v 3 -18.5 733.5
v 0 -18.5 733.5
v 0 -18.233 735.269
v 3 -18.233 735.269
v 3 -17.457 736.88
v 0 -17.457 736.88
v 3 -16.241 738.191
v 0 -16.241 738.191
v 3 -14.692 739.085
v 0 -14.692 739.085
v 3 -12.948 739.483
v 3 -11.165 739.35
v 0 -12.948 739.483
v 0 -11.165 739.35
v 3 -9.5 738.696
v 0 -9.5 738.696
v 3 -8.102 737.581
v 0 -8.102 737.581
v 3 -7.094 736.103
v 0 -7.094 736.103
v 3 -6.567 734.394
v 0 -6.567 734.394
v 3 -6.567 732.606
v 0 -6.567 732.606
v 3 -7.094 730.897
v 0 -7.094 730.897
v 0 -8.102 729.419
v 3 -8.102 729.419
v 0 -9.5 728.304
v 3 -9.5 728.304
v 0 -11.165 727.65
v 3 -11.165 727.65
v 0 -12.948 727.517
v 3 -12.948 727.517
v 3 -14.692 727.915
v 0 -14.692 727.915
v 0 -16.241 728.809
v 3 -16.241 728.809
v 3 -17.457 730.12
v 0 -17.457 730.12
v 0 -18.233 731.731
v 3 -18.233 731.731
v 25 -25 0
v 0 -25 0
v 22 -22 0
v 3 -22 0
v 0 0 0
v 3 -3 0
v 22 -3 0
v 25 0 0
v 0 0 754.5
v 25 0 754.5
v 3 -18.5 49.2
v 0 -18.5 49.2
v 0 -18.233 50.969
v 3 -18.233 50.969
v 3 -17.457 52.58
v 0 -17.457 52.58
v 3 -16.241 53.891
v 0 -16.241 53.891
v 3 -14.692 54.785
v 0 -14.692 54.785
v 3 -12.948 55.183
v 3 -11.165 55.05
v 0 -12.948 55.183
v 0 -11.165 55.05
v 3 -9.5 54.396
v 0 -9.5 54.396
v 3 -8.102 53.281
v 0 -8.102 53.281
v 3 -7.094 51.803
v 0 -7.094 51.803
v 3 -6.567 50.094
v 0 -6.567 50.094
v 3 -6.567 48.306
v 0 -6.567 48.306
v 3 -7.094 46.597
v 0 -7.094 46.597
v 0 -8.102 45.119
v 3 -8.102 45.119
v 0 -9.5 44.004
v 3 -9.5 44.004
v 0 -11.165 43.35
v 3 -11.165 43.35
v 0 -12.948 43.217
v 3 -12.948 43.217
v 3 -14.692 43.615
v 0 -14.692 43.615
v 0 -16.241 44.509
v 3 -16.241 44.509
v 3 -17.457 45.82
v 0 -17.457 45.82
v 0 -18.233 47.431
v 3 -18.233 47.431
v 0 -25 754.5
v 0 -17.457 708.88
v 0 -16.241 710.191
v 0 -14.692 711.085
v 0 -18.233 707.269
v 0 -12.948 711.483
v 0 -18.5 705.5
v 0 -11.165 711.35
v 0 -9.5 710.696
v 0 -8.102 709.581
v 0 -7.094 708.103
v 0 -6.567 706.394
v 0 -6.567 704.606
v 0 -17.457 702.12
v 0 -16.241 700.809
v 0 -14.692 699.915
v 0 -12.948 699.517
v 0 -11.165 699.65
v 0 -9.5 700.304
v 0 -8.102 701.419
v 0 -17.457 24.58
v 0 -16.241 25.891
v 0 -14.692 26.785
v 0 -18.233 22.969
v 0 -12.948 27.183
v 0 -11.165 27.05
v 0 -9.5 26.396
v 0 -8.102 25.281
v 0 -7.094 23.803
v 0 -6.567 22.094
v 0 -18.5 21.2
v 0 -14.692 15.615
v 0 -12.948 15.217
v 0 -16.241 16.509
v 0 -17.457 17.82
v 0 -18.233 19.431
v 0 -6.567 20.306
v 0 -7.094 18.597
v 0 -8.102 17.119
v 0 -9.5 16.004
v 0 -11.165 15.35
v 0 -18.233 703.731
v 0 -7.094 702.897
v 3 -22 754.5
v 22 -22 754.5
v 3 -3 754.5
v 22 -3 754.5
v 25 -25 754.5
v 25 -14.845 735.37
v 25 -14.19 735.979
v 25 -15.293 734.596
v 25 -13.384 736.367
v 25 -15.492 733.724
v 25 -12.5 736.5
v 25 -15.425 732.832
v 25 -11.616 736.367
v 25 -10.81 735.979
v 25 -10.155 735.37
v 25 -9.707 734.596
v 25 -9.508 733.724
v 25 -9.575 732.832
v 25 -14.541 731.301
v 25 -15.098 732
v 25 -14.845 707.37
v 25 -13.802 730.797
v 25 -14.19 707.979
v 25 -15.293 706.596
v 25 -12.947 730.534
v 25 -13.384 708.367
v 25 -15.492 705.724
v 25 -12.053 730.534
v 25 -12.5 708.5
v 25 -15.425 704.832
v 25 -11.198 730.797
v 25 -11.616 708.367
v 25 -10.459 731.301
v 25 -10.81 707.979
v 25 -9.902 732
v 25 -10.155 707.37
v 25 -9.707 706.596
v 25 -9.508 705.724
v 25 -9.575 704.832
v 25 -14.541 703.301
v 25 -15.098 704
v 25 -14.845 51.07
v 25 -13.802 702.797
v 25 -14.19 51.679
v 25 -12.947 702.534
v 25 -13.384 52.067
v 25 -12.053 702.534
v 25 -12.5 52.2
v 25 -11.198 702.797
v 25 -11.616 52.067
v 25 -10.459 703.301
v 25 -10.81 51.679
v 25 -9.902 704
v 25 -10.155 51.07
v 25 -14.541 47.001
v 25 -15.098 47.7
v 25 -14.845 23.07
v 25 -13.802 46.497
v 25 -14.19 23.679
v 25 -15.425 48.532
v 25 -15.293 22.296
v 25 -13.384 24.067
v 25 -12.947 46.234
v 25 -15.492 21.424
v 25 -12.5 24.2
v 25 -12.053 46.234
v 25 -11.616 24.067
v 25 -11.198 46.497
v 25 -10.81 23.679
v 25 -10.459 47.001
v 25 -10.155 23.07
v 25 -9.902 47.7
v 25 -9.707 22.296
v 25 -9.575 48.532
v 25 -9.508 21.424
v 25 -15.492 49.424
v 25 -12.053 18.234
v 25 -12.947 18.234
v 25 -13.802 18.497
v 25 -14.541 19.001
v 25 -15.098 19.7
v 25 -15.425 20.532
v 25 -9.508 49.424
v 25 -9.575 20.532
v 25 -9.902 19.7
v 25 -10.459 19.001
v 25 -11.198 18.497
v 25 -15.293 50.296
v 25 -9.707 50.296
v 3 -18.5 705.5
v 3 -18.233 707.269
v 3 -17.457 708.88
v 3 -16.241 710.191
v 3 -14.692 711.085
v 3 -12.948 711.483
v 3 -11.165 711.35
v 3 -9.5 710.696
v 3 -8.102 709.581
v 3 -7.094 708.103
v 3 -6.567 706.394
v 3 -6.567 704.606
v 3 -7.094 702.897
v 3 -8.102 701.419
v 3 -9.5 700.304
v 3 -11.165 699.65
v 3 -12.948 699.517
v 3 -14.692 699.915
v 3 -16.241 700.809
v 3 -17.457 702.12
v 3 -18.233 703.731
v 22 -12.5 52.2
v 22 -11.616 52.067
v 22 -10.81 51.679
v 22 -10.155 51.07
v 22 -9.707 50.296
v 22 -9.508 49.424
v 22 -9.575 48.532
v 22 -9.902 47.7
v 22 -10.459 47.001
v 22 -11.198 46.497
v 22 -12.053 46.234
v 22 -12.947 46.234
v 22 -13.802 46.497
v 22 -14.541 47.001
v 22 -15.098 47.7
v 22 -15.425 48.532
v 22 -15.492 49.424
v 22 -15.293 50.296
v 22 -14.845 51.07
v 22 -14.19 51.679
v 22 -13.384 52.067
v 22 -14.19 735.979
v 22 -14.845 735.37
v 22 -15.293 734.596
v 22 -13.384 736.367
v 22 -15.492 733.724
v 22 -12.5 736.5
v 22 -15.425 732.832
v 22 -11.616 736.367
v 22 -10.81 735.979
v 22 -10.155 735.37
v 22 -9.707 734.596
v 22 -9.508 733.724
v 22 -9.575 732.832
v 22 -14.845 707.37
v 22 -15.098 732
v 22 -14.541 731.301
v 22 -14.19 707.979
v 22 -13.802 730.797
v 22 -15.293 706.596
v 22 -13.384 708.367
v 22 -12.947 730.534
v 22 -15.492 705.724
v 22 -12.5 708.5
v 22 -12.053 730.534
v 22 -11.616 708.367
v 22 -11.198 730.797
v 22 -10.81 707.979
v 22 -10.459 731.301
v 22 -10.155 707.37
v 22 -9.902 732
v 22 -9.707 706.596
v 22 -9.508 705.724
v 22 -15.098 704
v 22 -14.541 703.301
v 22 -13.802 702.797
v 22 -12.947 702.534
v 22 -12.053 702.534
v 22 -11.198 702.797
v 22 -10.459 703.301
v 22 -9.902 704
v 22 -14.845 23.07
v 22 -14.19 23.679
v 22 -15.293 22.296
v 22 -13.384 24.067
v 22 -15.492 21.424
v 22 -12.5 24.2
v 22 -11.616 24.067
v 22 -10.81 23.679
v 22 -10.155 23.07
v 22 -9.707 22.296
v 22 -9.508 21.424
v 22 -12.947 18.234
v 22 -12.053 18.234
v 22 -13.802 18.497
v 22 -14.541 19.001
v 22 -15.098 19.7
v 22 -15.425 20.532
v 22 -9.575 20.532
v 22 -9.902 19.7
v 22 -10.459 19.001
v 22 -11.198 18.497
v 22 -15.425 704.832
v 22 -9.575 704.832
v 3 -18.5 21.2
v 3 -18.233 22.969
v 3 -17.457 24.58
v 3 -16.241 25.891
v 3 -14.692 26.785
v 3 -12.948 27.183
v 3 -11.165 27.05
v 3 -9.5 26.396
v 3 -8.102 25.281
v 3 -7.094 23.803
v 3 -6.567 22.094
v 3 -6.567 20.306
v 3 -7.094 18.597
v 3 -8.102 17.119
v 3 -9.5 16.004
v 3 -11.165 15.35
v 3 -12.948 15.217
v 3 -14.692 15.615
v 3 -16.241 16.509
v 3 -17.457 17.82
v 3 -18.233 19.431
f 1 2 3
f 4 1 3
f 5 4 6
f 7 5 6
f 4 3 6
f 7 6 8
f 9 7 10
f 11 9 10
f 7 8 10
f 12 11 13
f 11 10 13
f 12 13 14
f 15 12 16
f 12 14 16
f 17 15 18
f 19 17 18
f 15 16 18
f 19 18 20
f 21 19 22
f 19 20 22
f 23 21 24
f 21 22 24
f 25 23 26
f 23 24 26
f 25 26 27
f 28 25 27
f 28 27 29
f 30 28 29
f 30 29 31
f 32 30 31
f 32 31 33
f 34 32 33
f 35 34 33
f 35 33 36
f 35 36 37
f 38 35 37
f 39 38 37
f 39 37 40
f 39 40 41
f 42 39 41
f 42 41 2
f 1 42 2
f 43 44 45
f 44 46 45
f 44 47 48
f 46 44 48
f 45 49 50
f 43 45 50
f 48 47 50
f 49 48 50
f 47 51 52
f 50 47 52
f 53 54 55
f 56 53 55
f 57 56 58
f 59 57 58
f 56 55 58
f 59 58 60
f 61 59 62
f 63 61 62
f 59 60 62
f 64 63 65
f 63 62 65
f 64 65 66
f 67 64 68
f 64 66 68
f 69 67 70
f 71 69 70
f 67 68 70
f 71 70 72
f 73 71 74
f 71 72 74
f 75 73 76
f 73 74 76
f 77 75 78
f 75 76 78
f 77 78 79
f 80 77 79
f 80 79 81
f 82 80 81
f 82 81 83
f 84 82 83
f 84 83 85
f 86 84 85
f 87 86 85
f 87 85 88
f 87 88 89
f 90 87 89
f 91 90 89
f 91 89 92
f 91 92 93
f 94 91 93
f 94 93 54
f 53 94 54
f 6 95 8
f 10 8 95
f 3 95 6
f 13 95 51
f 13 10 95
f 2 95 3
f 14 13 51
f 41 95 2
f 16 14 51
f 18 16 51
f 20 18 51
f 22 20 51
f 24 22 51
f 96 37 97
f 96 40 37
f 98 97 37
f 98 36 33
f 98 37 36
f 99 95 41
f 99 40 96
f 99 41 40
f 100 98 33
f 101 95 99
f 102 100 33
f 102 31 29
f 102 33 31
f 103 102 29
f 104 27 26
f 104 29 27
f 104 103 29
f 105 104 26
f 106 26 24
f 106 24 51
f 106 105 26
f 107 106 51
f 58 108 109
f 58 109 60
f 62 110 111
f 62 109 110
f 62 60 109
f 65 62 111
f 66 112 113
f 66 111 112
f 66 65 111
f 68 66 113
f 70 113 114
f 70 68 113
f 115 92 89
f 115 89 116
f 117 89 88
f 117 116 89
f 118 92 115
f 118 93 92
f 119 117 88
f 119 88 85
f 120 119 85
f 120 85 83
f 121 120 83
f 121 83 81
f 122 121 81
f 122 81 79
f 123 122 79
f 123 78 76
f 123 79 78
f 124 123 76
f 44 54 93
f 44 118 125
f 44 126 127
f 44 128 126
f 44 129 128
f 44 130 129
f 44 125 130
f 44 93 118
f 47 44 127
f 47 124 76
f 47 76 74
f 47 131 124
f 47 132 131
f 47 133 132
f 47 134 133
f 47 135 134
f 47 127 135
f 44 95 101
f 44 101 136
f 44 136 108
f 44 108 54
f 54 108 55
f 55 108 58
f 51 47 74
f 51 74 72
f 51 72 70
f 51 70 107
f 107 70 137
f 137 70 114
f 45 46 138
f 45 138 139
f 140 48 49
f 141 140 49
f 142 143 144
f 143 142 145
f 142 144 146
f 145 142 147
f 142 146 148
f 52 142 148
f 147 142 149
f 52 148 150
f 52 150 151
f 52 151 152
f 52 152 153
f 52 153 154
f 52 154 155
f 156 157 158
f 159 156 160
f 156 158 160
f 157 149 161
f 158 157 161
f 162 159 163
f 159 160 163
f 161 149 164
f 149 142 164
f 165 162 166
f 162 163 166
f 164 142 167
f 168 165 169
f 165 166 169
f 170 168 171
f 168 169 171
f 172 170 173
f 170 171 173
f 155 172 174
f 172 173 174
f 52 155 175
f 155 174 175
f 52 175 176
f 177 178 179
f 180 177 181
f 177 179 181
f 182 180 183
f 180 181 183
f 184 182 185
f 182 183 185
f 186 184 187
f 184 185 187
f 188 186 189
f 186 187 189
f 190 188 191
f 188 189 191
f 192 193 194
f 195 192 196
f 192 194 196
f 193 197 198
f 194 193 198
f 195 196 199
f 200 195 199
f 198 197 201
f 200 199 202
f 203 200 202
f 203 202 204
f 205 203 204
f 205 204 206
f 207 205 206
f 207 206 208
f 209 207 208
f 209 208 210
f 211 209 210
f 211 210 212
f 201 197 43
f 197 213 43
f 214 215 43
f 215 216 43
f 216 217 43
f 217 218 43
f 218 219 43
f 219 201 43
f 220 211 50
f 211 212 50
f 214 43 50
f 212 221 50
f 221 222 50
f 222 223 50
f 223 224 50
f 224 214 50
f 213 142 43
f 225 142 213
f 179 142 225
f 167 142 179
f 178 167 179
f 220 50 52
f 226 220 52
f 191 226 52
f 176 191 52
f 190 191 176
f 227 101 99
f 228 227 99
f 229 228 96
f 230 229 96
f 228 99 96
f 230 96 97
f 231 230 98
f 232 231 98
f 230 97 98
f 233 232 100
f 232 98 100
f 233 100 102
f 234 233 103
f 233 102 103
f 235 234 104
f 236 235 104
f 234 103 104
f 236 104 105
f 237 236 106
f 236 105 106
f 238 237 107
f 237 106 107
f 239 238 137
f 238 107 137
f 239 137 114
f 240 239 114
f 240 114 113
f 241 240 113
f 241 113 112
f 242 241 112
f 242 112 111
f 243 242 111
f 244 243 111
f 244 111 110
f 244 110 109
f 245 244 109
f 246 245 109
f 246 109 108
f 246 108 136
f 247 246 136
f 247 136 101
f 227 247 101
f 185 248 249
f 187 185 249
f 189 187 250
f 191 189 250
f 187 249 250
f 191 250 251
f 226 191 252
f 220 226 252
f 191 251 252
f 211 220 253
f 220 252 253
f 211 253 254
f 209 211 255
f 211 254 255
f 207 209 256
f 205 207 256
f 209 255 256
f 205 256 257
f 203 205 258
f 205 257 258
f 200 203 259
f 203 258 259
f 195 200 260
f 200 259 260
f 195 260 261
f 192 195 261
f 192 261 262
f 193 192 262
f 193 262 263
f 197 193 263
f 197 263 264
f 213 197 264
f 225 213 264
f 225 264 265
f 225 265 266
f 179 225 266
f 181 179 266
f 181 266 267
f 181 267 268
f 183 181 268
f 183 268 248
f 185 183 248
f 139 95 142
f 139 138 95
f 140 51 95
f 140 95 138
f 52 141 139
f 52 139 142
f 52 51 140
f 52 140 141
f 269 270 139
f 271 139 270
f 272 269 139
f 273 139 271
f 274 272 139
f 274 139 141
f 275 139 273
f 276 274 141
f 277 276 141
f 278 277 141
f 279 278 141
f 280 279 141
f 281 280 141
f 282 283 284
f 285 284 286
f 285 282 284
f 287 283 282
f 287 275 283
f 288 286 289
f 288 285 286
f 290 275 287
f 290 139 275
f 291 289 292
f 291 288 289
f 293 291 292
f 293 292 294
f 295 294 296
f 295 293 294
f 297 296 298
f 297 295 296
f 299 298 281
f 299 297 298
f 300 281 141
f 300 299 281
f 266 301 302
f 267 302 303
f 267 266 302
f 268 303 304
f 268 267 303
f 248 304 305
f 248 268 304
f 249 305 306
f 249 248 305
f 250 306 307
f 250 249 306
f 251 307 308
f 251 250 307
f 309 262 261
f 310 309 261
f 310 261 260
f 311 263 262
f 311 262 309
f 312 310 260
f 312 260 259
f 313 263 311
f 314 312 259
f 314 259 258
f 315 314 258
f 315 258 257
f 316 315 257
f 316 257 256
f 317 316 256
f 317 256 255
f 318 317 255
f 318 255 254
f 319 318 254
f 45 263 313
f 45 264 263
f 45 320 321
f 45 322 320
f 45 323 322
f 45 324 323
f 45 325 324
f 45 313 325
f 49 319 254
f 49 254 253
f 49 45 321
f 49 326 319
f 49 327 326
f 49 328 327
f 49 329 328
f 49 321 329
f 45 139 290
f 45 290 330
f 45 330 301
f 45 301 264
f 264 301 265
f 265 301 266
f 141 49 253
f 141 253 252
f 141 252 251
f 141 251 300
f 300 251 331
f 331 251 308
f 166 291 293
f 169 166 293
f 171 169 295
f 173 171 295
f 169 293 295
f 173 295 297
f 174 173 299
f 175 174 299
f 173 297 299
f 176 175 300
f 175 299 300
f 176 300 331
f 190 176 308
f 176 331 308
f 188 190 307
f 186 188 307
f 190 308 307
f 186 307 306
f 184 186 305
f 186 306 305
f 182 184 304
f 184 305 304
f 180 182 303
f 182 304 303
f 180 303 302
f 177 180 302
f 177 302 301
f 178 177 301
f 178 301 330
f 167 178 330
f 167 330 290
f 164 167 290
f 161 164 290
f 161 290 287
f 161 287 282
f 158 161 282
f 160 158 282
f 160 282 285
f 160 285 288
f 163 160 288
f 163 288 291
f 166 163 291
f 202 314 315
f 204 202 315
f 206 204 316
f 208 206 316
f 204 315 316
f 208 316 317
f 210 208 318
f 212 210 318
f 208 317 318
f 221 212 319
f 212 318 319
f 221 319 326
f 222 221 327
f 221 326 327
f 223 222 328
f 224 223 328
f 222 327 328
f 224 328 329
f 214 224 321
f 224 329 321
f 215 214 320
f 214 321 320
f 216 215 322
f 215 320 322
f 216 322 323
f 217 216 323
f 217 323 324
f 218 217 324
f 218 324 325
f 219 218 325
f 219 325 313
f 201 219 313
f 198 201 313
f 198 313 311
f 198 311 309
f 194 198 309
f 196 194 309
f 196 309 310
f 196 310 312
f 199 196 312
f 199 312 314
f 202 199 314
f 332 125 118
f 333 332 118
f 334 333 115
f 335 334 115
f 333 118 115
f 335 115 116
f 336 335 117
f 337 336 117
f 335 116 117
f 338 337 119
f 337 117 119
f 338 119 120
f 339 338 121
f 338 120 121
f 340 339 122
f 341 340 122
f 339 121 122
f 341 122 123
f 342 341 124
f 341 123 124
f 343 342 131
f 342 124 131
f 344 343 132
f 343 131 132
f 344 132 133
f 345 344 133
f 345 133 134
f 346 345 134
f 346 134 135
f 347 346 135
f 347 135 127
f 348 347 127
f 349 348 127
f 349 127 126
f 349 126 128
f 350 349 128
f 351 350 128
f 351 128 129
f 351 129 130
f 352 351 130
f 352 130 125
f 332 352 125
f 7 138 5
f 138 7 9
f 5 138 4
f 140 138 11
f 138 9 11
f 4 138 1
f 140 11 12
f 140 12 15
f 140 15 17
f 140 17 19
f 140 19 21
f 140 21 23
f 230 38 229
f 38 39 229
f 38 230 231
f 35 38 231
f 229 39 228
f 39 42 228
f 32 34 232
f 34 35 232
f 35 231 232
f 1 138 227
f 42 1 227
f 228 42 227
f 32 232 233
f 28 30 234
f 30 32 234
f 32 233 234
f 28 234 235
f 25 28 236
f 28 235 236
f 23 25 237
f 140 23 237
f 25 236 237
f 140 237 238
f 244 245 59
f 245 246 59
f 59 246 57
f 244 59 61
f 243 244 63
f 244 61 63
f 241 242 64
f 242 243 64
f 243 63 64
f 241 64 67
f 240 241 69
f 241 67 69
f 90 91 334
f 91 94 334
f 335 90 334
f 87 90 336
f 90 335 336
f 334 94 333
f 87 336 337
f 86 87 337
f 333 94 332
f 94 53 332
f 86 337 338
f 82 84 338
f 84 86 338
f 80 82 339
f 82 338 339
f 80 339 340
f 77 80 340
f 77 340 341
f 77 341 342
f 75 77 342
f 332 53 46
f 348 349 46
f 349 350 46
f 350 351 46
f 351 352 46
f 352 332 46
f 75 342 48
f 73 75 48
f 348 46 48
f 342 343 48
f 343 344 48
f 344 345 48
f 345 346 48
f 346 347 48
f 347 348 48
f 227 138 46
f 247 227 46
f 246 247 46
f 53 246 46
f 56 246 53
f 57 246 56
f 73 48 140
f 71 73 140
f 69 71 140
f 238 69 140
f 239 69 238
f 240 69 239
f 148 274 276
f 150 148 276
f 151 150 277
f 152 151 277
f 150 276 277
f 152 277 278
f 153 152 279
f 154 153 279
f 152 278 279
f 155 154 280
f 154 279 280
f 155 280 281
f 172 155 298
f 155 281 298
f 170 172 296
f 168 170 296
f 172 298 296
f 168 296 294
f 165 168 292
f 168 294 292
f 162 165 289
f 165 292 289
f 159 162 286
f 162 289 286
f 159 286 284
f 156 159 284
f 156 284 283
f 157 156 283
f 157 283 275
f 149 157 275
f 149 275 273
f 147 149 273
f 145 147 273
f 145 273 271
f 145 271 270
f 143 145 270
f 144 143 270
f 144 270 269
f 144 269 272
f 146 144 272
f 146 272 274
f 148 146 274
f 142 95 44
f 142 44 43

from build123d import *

# Parameters (mm, degrees)
SKETCH_1_W             = 25
SKETCH_1_H             = 25
SKETCH_1_W_2           = 19
SKETCH_1_H_2           = 19
EXTRUDE_1_DEPTH        = 754.5
HOLE_WIZARD_6_0_6_1_D  = 6
CUT_EXTRUDE_1_REACH    = 757.328
SKETCH_5_R             = 6
PATTERN_LINEAR_1_COUNT = 2
PATTERN_LINEAR_1_PITCH = 684.3


with BuildPart() as part:
    # 草图1 → 拉伸1 (new body)
    with BuildSketch(Plane.XY):
        with Locations((12.5, -12.5)):
            Rectangle(SKETCH_1_W, SKETCH_1_H)
        with Locations((12.5, -12.5)):
            Rectangle(SKETCH_1_W_2, SKETCH_1_H_2, mode=Mode.SUBTRACT)
    extrude(amount=EXTRUDE_1_DEPTH)

    # Ø6.0 (6) 直径孔1 (through all)
    with Locations(Plane(origin=(25, 0, 0), x_dir=(0, 0, -1), z_dir=(1, 0, 0))):
        with Locations((-705.5, -12.5), (-733.5, -12.5)):
            hole_wizard_6_0_6_1 = Hole(HOLE_WIZARD_6_0_6_1_D / 2)

    # 草图5 → 切除-拉伸1 (cut, up to next)
    with BuildSketch(Plane.ZY, mode=Mode.PRIVATE) as cut_extrude_1_sk1:
        with Locations(Location((705.5, -12.5, 0), (0, 0, 270))):
            Circle(SKETCH_5_R)
    cut_extrude_1_tool1 = extrude(cut_extrude_1_sk1.sketch, amount=-CUT_EXTRUDE_1_REACH, mode=Mode.PRIVATE) & part.part
    # 草图5 → 切除-拉伸1 (cut, up to next)
    with BuildSketch(Plane.ZY, mode=Mode.PRIVATE) as cut_extrude_1_sk2:
        with Locations(Location((733.5, -12.5, 0), (0, 0, 270))):
            Circle(SKETCH_5_R)
    cut_extrude_1_tool2 = extrude(cut_extrude_1_sk2.sketch, amount=-CUT_EXTRUDE_1_REACH, mode=Mode.PRIVATE) & part.part
    cut_extrude_1_1 = cut_extrude_1_tool1.solids().sort_by_distance((0, -12.5, 705.5))[0]
    add(cut_extrude_1_1, mode=Mode.SUBTRACT)
    cut_extrude_1_2 = cut_extrude_1_tool2.solids().sort_by_distance((0, -12.5, 733.5))[0]
    add(cut_extrude_1_2, mode=Mode.SUBTRACT)
    cut_extrude_1 = cut_extrude_1_1 + cut_extrude_1_2  # 切除-拉伸1 as one shape, for the pattern or mirror that repeats it

    # 阵列(线性)1: Ø6.0 (6) 直径孔1, 切除-拉伸1 ×2
    with Locations(*[(0, 0, -i * PATTERN_LINEAR_1_PITCH) for i in range(1, PATTERN_LINEAR_1_COUNT)]):
        add(hole_wizard_6_0_6_1, mode=Mode.SUBTRACT)
        add(cut_extrude_1, mode=Mode.SUBTRACT)


solid = part.part
